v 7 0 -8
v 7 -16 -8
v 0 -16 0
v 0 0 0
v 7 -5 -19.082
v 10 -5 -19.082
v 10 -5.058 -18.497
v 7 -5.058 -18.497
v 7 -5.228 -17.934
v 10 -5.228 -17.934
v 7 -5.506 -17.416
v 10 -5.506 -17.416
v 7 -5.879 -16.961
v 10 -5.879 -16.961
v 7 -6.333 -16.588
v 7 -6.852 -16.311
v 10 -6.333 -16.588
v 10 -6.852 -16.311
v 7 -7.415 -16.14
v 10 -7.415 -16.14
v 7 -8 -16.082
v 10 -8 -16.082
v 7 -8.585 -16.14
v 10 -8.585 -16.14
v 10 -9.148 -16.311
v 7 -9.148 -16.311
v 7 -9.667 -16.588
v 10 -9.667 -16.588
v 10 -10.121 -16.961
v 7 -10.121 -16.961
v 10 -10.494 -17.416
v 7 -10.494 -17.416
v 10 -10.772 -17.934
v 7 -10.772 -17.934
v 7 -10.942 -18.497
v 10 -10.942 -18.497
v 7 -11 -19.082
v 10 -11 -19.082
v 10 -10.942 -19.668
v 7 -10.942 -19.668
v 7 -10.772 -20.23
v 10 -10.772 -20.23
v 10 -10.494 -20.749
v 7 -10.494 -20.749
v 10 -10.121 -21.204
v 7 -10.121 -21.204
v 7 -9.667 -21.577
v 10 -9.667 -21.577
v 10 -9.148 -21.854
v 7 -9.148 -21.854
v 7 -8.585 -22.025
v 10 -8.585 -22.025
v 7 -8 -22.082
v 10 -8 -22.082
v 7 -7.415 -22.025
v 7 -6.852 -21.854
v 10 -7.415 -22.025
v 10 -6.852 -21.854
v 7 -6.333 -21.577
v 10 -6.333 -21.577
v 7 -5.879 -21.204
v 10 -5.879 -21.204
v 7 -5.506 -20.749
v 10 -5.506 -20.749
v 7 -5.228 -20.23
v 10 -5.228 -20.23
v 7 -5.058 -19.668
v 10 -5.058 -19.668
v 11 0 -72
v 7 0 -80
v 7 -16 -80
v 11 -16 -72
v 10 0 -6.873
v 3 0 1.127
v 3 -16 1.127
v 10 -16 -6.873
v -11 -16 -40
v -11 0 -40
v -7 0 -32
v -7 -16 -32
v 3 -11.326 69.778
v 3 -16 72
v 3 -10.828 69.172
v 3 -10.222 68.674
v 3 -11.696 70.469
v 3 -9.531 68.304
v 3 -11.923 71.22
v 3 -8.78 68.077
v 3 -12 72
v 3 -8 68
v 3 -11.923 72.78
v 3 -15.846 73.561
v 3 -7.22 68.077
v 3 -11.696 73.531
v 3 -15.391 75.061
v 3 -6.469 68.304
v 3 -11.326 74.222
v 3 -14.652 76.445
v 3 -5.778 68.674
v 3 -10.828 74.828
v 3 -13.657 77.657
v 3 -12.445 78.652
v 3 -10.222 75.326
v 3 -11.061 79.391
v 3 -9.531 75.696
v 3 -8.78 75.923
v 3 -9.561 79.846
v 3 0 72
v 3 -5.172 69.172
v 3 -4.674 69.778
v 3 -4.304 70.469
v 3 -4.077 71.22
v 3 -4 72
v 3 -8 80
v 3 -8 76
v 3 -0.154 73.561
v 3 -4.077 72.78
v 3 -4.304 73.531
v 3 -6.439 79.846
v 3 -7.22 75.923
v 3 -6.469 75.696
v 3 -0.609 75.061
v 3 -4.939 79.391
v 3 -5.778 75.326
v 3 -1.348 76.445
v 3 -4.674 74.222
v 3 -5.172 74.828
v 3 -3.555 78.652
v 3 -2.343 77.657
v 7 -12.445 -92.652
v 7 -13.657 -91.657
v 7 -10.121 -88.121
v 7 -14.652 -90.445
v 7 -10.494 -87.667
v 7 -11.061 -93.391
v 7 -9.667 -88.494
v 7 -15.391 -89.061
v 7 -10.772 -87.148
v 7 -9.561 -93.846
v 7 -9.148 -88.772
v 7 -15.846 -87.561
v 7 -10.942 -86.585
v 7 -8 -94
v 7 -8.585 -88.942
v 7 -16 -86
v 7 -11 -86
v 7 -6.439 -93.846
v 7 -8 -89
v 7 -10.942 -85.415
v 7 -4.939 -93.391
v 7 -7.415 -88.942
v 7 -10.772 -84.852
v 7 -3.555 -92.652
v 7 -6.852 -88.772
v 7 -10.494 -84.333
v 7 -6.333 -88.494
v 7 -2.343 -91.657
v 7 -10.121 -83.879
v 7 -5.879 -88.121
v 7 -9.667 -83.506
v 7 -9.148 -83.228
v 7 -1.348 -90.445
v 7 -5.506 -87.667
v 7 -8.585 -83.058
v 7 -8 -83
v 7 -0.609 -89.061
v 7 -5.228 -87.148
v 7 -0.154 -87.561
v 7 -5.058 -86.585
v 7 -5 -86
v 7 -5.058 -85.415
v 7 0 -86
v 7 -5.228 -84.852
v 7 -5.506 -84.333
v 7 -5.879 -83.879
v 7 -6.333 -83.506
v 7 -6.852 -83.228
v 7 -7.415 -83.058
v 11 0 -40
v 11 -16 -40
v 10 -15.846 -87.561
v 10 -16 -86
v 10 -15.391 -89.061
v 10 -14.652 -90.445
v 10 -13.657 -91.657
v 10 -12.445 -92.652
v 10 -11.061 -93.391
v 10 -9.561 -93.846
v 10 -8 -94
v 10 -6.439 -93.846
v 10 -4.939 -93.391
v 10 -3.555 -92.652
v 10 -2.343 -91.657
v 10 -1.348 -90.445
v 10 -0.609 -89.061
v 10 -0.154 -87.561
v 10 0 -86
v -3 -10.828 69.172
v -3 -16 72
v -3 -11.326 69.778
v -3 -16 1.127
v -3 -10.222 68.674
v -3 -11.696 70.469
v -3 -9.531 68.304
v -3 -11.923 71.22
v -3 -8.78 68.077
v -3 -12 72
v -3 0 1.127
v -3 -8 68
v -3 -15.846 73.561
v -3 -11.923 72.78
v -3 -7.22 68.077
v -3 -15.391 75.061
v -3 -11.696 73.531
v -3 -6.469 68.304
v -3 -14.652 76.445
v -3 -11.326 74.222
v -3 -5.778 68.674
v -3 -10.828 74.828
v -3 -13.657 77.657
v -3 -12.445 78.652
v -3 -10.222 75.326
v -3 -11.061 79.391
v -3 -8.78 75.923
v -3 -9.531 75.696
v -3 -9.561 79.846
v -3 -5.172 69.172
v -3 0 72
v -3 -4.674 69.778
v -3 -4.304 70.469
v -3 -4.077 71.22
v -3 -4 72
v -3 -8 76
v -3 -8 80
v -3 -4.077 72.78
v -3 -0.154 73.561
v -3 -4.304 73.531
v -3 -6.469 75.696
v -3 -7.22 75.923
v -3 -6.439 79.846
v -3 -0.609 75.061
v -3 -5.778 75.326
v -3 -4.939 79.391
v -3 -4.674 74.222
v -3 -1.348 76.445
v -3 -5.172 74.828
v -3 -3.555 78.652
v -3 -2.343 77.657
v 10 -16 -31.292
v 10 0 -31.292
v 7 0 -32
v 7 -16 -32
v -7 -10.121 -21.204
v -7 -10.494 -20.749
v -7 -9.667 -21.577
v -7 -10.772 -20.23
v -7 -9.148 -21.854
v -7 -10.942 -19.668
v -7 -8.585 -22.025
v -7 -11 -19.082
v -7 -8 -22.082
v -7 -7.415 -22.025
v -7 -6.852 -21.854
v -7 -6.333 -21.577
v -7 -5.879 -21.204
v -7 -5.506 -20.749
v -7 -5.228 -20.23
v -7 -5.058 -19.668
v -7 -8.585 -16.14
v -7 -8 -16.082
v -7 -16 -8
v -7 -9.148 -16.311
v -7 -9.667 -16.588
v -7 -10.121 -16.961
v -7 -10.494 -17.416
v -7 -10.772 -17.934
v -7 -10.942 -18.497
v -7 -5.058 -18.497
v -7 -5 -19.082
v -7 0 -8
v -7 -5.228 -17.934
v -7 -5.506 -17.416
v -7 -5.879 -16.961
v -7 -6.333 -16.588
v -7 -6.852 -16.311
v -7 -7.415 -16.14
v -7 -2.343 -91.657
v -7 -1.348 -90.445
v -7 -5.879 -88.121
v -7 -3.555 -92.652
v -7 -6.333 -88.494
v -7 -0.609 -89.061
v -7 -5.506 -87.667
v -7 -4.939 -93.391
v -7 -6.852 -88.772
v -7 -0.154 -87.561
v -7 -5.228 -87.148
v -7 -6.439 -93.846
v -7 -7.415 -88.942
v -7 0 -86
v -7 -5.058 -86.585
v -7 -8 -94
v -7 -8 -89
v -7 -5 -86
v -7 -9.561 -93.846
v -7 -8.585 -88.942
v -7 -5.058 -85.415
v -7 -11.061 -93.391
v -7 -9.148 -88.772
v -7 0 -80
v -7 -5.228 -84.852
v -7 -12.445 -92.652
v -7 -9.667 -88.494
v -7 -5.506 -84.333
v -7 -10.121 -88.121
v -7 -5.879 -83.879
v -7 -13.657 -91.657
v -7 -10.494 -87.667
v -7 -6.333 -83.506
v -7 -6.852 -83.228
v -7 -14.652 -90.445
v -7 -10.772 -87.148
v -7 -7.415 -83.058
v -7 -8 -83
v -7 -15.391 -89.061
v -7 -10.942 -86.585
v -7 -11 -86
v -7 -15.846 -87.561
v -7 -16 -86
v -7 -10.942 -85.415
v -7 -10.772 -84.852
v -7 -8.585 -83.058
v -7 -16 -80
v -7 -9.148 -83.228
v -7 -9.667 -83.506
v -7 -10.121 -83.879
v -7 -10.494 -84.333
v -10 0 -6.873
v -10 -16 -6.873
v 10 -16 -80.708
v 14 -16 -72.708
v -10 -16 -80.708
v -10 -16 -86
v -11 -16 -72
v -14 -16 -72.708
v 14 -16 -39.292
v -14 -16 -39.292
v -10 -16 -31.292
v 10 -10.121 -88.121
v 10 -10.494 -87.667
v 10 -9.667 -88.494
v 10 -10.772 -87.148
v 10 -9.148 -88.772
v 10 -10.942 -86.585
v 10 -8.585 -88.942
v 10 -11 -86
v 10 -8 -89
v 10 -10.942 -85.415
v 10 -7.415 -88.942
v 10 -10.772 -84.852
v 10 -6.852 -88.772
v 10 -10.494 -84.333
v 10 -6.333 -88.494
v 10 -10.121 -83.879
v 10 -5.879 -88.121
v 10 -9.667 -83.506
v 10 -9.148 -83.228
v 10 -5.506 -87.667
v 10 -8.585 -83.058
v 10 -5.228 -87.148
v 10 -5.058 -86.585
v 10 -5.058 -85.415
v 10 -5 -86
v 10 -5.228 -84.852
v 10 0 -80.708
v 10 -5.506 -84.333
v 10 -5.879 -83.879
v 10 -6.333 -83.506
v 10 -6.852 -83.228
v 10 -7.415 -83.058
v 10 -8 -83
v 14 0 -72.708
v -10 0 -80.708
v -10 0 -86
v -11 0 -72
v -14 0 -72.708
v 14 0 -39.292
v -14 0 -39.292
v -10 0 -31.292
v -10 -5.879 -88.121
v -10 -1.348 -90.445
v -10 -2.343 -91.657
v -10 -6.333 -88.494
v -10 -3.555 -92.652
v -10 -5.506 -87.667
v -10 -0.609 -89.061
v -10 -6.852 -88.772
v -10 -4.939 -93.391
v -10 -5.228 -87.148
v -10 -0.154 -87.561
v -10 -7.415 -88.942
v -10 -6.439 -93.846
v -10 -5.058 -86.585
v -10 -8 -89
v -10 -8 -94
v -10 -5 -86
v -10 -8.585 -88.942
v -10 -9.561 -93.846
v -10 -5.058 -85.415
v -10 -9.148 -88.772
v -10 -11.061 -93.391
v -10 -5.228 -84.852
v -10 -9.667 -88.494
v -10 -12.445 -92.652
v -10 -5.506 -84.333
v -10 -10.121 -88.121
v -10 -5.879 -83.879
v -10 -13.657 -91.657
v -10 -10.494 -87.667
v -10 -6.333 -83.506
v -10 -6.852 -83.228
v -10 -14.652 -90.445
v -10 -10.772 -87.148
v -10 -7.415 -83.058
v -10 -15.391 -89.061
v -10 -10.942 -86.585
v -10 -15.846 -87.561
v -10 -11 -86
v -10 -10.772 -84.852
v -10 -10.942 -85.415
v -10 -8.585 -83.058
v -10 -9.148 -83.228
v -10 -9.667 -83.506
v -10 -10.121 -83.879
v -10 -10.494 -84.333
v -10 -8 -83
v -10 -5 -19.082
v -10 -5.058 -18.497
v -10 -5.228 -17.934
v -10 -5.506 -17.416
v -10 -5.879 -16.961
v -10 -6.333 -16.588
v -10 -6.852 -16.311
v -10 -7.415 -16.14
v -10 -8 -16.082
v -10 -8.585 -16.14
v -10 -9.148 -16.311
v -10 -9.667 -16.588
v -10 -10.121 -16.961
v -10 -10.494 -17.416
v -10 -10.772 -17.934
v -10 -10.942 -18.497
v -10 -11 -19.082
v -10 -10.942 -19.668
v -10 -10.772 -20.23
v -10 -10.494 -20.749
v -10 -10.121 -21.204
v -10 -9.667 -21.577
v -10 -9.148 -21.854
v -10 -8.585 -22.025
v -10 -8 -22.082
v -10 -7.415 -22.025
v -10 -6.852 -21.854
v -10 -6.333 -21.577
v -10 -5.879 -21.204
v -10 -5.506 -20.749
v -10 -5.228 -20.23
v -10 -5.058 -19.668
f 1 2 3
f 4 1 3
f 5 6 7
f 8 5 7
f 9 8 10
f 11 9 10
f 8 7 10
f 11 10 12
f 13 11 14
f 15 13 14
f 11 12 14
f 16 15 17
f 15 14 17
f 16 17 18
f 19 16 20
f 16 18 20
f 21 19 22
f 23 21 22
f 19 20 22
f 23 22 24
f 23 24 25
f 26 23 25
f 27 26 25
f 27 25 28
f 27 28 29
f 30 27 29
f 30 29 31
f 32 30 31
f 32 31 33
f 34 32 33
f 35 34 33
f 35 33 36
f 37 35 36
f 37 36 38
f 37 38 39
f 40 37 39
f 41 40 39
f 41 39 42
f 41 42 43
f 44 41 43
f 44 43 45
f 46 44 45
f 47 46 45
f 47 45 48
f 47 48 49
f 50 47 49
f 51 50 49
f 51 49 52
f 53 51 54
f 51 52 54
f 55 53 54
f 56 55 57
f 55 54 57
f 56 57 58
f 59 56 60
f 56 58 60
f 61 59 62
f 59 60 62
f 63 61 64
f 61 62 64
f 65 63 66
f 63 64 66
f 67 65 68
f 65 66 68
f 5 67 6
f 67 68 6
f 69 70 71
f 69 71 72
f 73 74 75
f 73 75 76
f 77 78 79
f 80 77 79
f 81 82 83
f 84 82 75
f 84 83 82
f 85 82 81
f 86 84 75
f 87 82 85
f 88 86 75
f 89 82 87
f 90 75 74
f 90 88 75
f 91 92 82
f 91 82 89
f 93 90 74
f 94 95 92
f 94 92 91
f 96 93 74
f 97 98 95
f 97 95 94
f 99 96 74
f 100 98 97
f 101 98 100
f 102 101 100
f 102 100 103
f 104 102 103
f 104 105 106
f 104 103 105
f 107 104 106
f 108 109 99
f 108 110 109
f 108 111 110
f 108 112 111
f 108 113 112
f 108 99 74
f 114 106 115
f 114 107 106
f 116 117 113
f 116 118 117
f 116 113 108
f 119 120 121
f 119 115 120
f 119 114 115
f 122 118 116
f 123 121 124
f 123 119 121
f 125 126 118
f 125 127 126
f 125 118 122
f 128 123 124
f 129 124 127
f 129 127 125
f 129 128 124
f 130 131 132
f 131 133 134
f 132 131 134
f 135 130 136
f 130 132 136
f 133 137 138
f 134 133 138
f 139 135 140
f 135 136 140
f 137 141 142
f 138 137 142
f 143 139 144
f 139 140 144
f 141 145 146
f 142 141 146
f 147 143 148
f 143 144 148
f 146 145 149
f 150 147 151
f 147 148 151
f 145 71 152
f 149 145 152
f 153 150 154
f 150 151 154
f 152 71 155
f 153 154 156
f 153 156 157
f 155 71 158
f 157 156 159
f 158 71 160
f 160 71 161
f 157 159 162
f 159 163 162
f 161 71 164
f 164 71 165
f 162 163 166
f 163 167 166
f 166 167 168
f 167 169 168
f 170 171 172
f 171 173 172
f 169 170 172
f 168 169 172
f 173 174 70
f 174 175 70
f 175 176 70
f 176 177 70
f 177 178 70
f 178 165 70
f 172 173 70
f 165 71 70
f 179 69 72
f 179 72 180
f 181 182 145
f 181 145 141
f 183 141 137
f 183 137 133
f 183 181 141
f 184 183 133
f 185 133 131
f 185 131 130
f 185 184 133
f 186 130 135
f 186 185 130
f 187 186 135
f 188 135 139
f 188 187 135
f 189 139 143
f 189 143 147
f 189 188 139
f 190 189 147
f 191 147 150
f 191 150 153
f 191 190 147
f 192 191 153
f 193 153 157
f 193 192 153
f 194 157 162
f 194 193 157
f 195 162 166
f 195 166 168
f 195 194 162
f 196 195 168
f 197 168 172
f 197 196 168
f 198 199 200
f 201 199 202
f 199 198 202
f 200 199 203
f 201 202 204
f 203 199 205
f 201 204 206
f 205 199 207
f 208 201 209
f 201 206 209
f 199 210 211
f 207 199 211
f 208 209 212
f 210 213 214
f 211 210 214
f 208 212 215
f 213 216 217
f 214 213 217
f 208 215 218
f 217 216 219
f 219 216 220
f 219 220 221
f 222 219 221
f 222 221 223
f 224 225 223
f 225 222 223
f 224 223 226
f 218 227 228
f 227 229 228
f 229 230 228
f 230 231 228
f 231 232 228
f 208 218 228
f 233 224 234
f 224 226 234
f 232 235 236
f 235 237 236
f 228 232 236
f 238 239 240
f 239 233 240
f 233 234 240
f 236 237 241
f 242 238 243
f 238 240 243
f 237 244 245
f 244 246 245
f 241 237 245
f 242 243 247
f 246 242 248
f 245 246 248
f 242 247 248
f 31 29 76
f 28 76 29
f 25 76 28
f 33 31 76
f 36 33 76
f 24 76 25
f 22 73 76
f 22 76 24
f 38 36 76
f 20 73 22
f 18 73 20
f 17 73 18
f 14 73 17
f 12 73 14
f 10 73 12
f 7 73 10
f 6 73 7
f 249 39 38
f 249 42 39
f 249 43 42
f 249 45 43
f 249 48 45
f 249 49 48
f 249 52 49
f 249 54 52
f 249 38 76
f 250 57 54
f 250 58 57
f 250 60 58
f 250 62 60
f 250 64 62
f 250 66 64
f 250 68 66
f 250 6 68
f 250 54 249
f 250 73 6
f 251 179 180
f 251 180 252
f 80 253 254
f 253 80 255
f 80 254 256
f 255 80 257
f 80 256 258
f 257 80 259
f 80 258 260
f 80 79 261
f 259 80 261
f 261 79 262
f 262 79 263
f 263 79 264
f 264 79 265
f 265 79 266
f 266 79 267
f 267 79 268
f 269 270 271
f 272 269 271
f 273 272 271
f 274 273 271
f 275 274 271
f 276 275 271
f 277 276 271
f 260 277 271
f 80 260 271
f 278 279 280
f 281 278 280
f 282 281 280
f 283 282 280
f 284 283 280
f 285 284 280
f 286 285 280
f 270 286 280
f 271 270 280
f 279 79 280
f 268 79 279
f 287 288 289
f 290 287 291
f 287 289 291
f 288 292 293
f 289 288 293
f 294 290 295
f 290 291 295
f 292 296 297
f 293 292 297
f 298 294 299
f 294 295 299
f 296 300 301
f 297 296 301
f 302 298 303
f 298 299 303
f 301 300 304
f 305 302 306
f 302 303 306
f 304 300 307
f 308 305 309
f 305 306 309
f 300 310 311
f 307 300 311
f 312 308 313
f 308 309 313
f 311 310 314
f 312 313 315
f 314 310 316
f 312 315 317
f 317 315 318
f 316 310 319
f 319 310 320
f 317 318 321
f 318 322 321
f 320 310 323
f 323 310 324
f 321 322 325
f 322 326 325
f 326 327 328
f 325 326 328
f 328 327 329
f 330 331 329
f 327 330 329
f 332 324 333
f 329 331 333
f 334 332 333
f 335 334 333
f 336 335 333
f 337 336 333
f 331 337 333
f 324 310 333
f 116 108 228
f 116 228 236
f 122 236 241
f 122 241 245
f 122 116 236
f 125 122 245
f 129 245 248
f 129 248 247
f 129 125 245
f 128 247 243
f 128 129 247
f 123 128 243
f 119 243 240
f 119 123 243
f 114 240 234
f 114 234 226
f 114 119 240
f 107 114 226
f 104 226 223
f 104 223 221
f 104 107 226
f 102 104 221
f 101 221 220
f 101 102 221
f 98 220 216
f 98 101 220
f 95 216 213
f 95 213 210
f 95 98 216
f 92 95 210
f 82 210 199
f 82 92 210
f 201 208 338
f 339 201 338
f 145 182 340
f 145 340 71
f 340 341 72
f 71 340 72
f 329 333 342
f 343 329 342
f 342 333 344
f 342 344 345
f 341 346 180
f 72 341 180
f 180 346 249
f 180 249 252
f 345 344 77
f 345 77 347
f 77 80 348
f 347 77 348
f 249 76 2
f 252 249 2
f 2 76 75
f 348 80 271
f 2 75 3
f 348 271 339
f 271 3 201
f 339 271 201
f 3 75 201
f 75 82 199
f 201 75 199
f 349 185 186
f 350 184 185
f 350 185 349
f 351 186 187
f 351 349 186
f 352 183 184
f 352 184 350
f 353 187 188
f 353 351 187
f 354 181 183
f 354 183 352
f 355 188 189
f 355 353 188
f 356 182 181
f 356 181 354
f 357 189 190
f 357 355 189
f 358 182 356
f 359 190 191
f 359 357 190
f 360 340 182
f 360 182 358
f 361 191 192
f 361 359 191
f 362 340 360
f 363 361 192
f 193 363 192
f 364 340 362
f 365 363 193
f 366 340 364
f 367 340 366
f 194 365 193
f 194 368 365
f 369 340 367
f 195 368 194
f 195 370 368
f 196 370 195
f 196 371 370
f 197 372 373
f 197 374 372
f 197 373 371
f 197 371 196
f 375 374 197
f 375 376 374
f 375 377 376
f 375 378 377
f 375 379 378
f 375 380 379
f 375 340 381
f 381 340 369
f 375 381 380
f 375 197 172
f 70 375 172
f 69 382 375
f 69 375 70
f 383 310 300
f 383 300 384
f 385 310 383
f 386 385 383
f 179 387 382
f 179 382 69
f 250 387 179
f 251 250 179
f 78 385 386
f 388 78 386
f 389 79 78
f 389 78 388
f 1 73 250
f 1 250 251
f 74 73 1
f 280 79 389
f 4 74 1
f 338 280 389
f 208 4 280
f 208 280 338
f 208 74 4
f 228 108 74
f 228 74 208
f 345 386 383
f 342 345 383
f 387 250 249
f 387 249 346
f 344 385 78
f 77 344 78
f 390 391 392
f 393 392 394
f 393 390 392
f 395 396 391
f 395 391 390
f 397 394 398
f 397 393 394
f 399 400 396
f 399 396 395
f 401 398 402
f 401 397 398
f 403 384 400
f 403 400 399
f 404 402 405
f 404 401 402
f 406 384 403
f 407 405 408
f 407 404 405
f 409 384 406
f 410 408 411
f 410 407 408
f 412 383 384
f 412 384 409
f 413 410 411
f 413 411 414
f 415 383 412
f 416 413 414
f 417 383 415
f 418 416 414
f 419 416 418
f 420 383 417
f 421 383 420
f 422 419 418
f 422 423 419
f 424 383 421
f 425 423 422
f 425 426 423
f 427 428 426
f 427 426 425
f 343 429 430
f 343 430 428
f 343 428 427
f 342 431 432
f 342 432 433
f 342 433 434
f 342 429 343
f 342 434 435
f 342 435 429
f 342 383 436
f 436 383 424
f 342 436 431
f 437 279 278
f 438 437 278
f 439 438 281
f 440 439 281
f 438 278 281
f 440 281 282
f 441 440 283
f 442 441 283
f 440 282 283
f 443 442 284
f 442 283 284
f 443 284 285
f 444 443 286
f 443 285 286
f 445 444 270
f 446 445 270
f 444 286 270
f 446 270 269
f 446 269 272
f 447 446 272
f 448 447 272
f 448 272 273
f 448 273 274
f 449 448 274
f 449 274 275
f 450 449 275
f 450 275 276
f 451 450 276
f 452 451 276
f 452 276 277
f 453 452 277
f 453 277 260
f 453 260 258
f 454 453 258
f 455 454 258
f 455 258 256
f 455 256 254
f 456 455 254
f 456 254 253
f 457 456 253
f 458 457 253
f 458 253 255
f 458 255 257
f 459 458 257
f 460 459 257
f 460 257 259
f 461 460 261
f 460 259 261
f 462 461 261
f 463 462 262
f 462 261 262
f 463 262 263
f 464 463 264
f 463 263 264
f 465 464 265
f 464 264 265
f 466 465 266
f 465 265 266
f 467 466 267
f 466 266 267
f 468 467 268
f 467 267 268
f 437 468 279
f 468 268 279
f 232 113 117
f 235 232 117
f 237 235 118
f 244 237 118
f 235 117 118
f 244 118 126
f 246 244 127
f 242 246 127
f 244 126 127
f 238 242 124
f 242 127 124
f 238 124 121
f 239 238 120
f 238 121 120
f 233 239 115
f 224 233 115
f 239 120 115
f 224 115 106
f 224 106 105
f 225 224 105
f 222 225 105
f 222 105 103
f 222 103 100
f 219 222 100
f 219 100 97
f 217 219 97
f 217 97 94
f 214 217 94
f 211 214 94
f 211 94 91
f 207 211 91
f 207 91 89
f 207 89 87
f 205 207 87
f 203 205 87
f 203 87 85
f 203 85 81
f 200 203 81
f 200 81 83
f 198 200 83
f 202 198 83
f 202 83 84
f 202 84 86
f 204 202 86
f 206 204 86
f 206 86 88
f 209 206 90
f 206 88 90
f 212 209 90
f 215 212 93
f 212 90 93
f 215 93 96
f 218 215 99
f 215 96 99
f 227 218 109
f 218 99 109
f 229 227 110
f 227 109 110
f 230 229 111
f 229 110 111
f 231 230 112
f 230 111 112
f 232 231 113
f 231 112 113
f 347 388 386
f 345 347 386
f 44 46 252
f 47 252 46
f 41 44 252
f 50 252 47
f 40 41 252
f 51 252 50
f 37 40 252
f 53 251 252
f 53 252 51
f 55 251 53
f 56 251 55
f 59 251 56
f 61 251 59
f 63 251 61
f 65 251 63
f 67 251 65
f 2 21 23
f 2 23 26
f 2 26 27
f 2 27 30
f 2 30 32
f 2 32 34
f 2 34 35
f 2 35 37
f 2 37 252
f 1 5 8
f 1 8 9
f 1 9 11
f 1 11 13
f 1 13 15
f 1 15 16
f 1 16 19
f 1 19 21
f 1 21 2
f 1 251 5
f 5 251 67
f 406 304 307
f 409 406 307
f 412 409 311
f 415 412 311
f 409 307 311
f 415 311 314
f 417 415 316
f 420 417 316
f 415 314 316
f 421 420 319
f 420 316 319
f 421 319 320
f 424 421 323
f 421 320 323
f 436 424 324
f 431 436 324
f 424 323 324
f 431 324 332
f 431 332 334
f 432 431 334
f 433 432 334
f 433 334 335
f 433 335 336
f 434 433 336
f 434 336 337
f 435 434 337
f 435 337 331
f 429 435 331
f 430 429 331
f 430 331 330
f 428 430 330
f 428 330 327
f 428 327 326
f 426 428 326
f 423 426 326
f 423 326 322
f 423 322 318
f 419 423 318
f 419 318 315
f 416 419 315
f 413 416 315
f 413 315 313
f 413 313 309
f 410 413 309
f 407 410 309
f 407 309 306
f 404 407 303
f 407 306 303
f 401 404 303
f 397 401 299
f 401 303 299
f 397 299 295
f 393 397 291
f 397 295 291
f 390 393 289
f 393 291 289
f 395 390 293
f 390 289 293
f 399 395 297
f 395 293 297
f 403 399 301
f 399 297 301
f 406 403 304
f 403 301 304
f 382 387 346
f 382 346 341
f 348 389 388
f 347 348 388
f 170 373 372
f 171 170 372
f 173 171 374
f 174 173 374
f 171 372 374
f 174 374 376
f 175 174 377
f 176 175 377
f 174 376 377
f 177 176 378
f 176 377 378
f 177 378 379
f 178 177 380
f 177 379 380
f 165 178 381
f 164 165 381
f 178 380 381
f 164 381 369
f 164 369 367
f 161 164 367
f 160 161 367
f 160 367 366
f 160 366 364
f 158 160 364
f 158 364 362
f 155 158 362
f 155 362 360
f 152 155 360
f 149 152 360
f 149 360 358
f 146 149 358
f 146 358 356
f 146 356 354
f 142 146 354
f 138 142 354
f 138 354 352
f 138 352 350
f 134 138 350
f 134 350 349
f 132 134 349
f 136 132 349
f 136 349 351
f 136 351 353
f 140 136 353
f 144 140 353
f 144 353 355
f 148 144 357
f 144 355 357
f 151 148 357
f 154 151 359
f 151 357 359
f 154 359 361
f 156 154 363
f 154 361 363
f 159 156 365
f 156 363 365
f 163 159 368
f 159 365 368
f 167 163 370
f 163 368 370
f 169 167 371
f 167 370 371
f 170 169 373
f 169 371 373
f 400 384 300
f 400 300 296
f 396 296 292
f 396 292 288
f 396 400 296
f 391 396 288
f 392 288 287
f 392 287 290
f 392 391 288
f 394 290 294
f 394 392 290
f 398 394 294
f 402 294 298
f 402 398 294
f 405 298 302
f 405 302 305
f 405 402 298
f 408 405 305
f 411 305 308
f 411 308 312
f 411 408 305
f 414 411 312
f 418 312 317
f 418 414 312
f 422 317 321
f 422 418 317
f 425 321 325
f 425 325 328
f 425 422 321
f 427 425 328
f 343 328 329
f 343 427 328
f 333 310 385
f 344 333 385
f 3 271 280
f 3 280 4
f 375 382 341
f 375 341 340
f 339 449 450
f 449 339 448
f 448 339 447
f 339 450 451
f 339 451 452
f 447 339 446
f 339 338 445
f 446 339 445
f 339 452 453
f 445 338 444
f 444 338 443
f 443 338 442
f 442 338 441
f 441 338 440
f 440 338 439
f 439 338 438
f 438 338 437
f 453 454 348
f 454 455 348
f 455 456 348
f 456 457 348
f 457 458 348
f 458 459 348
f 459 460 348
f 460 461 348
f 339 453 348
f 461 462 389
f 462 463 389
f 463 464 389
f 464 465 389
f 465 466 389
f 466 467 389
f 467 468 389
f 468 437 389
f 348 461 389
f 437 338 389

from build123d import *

# Parameters (mm, degrees)
F1_DEPTH  = 16
F6_DEPTH  = 6
F7_DEPTH  = 3
F8_DEPTH  = 3
F9_R      = 4
F12_DEPTH = 25
F11_R     = 3
F13_DEPTH = 50
F10_R     = 3
F14_DEPTH = 50


with BuildPart() as f1:
    # F0 (on Front) → F1 (new body)
    with BuildSketch(Plane.XZ):
        Polygon((0, 0), (0, 72), (-3, 72), (-3, 1.127205), (-10, -6.872795), (-10, -31.291796), (-14, -39.291796), (-14, -72.708204), (-10, -80.708204), (-10, -86), (-7, -86), (-7, -80), (-11, -72), (-11, -40), (-7, -32), (-7, -8), align=None)
    extrude(amount=F1_DEPTH)

    # F2: F1 across plane


with BuildPart() as f1_1:
    add(f1.part)
    add(f1.part.mirror(Plane.YZ))

    # F3 (on face) → F6 (join)
    with BuildSketch(Plane.YZ.offset(3)):
        with BuildLine():
            Line((-16, 72), (0, 72))
            ThreePointArc((0, 72), (-8, 80), (-16, 72))
        make_face()
    extrude(amount=-F6_DEPTH)

    # F5 (on face) → F7 (join)
    with BuildSketch(Plane(origin=(-10, 0, 0), x_dir=(0, -1, 0), z_dir=(-1, 0, 0))):
        with BuildLine():
            Line((16, -86), (0, -86))
            ThreePointArc((0, -86), (8, -94), (16, -86))
        make_face()
    extrude(amount=-F7_DEPTH)

    # F4 (on face) → F8 (join)
    with BuildSketch(Plane.YZ.offset(10)):
        with BuildLine():
            Line((0, -86), (-16, -86))
            ThreePointArc((-16, -86), (-8, -94), (0, -86))
        make_face()
    extrude(amount=-F8_DEPTH)

    # F9 (on face) → F12 (cut)
    with BuildSketch(Plane.YZ.offset(3)):
        with Locations((-8, 72)):
            Circle(F9_R)
    extrude(amount=-F12_DEPTH, mode=Mode.SUBTRACT)

    # F11 (on face) → F13 (cut)
    with BuildSketch(Plane.YZ.offset(10)):
        with Locations((-8, -19.082295)):
            Circle(F11_R)
    extrude(amount=-F13_DEPTH, mode=Mode.SUBTRACT)

    # F10 (on face) → F14 (cut)
    with BuildSketch(Plane.YZ.offset(10)):
        with Locations((-8, -86)):
            Circle(F10_R)
    extrude(amount=-F14_DEPTH, mode=Mode.SUBTRACT)


solid = f1_1.part
